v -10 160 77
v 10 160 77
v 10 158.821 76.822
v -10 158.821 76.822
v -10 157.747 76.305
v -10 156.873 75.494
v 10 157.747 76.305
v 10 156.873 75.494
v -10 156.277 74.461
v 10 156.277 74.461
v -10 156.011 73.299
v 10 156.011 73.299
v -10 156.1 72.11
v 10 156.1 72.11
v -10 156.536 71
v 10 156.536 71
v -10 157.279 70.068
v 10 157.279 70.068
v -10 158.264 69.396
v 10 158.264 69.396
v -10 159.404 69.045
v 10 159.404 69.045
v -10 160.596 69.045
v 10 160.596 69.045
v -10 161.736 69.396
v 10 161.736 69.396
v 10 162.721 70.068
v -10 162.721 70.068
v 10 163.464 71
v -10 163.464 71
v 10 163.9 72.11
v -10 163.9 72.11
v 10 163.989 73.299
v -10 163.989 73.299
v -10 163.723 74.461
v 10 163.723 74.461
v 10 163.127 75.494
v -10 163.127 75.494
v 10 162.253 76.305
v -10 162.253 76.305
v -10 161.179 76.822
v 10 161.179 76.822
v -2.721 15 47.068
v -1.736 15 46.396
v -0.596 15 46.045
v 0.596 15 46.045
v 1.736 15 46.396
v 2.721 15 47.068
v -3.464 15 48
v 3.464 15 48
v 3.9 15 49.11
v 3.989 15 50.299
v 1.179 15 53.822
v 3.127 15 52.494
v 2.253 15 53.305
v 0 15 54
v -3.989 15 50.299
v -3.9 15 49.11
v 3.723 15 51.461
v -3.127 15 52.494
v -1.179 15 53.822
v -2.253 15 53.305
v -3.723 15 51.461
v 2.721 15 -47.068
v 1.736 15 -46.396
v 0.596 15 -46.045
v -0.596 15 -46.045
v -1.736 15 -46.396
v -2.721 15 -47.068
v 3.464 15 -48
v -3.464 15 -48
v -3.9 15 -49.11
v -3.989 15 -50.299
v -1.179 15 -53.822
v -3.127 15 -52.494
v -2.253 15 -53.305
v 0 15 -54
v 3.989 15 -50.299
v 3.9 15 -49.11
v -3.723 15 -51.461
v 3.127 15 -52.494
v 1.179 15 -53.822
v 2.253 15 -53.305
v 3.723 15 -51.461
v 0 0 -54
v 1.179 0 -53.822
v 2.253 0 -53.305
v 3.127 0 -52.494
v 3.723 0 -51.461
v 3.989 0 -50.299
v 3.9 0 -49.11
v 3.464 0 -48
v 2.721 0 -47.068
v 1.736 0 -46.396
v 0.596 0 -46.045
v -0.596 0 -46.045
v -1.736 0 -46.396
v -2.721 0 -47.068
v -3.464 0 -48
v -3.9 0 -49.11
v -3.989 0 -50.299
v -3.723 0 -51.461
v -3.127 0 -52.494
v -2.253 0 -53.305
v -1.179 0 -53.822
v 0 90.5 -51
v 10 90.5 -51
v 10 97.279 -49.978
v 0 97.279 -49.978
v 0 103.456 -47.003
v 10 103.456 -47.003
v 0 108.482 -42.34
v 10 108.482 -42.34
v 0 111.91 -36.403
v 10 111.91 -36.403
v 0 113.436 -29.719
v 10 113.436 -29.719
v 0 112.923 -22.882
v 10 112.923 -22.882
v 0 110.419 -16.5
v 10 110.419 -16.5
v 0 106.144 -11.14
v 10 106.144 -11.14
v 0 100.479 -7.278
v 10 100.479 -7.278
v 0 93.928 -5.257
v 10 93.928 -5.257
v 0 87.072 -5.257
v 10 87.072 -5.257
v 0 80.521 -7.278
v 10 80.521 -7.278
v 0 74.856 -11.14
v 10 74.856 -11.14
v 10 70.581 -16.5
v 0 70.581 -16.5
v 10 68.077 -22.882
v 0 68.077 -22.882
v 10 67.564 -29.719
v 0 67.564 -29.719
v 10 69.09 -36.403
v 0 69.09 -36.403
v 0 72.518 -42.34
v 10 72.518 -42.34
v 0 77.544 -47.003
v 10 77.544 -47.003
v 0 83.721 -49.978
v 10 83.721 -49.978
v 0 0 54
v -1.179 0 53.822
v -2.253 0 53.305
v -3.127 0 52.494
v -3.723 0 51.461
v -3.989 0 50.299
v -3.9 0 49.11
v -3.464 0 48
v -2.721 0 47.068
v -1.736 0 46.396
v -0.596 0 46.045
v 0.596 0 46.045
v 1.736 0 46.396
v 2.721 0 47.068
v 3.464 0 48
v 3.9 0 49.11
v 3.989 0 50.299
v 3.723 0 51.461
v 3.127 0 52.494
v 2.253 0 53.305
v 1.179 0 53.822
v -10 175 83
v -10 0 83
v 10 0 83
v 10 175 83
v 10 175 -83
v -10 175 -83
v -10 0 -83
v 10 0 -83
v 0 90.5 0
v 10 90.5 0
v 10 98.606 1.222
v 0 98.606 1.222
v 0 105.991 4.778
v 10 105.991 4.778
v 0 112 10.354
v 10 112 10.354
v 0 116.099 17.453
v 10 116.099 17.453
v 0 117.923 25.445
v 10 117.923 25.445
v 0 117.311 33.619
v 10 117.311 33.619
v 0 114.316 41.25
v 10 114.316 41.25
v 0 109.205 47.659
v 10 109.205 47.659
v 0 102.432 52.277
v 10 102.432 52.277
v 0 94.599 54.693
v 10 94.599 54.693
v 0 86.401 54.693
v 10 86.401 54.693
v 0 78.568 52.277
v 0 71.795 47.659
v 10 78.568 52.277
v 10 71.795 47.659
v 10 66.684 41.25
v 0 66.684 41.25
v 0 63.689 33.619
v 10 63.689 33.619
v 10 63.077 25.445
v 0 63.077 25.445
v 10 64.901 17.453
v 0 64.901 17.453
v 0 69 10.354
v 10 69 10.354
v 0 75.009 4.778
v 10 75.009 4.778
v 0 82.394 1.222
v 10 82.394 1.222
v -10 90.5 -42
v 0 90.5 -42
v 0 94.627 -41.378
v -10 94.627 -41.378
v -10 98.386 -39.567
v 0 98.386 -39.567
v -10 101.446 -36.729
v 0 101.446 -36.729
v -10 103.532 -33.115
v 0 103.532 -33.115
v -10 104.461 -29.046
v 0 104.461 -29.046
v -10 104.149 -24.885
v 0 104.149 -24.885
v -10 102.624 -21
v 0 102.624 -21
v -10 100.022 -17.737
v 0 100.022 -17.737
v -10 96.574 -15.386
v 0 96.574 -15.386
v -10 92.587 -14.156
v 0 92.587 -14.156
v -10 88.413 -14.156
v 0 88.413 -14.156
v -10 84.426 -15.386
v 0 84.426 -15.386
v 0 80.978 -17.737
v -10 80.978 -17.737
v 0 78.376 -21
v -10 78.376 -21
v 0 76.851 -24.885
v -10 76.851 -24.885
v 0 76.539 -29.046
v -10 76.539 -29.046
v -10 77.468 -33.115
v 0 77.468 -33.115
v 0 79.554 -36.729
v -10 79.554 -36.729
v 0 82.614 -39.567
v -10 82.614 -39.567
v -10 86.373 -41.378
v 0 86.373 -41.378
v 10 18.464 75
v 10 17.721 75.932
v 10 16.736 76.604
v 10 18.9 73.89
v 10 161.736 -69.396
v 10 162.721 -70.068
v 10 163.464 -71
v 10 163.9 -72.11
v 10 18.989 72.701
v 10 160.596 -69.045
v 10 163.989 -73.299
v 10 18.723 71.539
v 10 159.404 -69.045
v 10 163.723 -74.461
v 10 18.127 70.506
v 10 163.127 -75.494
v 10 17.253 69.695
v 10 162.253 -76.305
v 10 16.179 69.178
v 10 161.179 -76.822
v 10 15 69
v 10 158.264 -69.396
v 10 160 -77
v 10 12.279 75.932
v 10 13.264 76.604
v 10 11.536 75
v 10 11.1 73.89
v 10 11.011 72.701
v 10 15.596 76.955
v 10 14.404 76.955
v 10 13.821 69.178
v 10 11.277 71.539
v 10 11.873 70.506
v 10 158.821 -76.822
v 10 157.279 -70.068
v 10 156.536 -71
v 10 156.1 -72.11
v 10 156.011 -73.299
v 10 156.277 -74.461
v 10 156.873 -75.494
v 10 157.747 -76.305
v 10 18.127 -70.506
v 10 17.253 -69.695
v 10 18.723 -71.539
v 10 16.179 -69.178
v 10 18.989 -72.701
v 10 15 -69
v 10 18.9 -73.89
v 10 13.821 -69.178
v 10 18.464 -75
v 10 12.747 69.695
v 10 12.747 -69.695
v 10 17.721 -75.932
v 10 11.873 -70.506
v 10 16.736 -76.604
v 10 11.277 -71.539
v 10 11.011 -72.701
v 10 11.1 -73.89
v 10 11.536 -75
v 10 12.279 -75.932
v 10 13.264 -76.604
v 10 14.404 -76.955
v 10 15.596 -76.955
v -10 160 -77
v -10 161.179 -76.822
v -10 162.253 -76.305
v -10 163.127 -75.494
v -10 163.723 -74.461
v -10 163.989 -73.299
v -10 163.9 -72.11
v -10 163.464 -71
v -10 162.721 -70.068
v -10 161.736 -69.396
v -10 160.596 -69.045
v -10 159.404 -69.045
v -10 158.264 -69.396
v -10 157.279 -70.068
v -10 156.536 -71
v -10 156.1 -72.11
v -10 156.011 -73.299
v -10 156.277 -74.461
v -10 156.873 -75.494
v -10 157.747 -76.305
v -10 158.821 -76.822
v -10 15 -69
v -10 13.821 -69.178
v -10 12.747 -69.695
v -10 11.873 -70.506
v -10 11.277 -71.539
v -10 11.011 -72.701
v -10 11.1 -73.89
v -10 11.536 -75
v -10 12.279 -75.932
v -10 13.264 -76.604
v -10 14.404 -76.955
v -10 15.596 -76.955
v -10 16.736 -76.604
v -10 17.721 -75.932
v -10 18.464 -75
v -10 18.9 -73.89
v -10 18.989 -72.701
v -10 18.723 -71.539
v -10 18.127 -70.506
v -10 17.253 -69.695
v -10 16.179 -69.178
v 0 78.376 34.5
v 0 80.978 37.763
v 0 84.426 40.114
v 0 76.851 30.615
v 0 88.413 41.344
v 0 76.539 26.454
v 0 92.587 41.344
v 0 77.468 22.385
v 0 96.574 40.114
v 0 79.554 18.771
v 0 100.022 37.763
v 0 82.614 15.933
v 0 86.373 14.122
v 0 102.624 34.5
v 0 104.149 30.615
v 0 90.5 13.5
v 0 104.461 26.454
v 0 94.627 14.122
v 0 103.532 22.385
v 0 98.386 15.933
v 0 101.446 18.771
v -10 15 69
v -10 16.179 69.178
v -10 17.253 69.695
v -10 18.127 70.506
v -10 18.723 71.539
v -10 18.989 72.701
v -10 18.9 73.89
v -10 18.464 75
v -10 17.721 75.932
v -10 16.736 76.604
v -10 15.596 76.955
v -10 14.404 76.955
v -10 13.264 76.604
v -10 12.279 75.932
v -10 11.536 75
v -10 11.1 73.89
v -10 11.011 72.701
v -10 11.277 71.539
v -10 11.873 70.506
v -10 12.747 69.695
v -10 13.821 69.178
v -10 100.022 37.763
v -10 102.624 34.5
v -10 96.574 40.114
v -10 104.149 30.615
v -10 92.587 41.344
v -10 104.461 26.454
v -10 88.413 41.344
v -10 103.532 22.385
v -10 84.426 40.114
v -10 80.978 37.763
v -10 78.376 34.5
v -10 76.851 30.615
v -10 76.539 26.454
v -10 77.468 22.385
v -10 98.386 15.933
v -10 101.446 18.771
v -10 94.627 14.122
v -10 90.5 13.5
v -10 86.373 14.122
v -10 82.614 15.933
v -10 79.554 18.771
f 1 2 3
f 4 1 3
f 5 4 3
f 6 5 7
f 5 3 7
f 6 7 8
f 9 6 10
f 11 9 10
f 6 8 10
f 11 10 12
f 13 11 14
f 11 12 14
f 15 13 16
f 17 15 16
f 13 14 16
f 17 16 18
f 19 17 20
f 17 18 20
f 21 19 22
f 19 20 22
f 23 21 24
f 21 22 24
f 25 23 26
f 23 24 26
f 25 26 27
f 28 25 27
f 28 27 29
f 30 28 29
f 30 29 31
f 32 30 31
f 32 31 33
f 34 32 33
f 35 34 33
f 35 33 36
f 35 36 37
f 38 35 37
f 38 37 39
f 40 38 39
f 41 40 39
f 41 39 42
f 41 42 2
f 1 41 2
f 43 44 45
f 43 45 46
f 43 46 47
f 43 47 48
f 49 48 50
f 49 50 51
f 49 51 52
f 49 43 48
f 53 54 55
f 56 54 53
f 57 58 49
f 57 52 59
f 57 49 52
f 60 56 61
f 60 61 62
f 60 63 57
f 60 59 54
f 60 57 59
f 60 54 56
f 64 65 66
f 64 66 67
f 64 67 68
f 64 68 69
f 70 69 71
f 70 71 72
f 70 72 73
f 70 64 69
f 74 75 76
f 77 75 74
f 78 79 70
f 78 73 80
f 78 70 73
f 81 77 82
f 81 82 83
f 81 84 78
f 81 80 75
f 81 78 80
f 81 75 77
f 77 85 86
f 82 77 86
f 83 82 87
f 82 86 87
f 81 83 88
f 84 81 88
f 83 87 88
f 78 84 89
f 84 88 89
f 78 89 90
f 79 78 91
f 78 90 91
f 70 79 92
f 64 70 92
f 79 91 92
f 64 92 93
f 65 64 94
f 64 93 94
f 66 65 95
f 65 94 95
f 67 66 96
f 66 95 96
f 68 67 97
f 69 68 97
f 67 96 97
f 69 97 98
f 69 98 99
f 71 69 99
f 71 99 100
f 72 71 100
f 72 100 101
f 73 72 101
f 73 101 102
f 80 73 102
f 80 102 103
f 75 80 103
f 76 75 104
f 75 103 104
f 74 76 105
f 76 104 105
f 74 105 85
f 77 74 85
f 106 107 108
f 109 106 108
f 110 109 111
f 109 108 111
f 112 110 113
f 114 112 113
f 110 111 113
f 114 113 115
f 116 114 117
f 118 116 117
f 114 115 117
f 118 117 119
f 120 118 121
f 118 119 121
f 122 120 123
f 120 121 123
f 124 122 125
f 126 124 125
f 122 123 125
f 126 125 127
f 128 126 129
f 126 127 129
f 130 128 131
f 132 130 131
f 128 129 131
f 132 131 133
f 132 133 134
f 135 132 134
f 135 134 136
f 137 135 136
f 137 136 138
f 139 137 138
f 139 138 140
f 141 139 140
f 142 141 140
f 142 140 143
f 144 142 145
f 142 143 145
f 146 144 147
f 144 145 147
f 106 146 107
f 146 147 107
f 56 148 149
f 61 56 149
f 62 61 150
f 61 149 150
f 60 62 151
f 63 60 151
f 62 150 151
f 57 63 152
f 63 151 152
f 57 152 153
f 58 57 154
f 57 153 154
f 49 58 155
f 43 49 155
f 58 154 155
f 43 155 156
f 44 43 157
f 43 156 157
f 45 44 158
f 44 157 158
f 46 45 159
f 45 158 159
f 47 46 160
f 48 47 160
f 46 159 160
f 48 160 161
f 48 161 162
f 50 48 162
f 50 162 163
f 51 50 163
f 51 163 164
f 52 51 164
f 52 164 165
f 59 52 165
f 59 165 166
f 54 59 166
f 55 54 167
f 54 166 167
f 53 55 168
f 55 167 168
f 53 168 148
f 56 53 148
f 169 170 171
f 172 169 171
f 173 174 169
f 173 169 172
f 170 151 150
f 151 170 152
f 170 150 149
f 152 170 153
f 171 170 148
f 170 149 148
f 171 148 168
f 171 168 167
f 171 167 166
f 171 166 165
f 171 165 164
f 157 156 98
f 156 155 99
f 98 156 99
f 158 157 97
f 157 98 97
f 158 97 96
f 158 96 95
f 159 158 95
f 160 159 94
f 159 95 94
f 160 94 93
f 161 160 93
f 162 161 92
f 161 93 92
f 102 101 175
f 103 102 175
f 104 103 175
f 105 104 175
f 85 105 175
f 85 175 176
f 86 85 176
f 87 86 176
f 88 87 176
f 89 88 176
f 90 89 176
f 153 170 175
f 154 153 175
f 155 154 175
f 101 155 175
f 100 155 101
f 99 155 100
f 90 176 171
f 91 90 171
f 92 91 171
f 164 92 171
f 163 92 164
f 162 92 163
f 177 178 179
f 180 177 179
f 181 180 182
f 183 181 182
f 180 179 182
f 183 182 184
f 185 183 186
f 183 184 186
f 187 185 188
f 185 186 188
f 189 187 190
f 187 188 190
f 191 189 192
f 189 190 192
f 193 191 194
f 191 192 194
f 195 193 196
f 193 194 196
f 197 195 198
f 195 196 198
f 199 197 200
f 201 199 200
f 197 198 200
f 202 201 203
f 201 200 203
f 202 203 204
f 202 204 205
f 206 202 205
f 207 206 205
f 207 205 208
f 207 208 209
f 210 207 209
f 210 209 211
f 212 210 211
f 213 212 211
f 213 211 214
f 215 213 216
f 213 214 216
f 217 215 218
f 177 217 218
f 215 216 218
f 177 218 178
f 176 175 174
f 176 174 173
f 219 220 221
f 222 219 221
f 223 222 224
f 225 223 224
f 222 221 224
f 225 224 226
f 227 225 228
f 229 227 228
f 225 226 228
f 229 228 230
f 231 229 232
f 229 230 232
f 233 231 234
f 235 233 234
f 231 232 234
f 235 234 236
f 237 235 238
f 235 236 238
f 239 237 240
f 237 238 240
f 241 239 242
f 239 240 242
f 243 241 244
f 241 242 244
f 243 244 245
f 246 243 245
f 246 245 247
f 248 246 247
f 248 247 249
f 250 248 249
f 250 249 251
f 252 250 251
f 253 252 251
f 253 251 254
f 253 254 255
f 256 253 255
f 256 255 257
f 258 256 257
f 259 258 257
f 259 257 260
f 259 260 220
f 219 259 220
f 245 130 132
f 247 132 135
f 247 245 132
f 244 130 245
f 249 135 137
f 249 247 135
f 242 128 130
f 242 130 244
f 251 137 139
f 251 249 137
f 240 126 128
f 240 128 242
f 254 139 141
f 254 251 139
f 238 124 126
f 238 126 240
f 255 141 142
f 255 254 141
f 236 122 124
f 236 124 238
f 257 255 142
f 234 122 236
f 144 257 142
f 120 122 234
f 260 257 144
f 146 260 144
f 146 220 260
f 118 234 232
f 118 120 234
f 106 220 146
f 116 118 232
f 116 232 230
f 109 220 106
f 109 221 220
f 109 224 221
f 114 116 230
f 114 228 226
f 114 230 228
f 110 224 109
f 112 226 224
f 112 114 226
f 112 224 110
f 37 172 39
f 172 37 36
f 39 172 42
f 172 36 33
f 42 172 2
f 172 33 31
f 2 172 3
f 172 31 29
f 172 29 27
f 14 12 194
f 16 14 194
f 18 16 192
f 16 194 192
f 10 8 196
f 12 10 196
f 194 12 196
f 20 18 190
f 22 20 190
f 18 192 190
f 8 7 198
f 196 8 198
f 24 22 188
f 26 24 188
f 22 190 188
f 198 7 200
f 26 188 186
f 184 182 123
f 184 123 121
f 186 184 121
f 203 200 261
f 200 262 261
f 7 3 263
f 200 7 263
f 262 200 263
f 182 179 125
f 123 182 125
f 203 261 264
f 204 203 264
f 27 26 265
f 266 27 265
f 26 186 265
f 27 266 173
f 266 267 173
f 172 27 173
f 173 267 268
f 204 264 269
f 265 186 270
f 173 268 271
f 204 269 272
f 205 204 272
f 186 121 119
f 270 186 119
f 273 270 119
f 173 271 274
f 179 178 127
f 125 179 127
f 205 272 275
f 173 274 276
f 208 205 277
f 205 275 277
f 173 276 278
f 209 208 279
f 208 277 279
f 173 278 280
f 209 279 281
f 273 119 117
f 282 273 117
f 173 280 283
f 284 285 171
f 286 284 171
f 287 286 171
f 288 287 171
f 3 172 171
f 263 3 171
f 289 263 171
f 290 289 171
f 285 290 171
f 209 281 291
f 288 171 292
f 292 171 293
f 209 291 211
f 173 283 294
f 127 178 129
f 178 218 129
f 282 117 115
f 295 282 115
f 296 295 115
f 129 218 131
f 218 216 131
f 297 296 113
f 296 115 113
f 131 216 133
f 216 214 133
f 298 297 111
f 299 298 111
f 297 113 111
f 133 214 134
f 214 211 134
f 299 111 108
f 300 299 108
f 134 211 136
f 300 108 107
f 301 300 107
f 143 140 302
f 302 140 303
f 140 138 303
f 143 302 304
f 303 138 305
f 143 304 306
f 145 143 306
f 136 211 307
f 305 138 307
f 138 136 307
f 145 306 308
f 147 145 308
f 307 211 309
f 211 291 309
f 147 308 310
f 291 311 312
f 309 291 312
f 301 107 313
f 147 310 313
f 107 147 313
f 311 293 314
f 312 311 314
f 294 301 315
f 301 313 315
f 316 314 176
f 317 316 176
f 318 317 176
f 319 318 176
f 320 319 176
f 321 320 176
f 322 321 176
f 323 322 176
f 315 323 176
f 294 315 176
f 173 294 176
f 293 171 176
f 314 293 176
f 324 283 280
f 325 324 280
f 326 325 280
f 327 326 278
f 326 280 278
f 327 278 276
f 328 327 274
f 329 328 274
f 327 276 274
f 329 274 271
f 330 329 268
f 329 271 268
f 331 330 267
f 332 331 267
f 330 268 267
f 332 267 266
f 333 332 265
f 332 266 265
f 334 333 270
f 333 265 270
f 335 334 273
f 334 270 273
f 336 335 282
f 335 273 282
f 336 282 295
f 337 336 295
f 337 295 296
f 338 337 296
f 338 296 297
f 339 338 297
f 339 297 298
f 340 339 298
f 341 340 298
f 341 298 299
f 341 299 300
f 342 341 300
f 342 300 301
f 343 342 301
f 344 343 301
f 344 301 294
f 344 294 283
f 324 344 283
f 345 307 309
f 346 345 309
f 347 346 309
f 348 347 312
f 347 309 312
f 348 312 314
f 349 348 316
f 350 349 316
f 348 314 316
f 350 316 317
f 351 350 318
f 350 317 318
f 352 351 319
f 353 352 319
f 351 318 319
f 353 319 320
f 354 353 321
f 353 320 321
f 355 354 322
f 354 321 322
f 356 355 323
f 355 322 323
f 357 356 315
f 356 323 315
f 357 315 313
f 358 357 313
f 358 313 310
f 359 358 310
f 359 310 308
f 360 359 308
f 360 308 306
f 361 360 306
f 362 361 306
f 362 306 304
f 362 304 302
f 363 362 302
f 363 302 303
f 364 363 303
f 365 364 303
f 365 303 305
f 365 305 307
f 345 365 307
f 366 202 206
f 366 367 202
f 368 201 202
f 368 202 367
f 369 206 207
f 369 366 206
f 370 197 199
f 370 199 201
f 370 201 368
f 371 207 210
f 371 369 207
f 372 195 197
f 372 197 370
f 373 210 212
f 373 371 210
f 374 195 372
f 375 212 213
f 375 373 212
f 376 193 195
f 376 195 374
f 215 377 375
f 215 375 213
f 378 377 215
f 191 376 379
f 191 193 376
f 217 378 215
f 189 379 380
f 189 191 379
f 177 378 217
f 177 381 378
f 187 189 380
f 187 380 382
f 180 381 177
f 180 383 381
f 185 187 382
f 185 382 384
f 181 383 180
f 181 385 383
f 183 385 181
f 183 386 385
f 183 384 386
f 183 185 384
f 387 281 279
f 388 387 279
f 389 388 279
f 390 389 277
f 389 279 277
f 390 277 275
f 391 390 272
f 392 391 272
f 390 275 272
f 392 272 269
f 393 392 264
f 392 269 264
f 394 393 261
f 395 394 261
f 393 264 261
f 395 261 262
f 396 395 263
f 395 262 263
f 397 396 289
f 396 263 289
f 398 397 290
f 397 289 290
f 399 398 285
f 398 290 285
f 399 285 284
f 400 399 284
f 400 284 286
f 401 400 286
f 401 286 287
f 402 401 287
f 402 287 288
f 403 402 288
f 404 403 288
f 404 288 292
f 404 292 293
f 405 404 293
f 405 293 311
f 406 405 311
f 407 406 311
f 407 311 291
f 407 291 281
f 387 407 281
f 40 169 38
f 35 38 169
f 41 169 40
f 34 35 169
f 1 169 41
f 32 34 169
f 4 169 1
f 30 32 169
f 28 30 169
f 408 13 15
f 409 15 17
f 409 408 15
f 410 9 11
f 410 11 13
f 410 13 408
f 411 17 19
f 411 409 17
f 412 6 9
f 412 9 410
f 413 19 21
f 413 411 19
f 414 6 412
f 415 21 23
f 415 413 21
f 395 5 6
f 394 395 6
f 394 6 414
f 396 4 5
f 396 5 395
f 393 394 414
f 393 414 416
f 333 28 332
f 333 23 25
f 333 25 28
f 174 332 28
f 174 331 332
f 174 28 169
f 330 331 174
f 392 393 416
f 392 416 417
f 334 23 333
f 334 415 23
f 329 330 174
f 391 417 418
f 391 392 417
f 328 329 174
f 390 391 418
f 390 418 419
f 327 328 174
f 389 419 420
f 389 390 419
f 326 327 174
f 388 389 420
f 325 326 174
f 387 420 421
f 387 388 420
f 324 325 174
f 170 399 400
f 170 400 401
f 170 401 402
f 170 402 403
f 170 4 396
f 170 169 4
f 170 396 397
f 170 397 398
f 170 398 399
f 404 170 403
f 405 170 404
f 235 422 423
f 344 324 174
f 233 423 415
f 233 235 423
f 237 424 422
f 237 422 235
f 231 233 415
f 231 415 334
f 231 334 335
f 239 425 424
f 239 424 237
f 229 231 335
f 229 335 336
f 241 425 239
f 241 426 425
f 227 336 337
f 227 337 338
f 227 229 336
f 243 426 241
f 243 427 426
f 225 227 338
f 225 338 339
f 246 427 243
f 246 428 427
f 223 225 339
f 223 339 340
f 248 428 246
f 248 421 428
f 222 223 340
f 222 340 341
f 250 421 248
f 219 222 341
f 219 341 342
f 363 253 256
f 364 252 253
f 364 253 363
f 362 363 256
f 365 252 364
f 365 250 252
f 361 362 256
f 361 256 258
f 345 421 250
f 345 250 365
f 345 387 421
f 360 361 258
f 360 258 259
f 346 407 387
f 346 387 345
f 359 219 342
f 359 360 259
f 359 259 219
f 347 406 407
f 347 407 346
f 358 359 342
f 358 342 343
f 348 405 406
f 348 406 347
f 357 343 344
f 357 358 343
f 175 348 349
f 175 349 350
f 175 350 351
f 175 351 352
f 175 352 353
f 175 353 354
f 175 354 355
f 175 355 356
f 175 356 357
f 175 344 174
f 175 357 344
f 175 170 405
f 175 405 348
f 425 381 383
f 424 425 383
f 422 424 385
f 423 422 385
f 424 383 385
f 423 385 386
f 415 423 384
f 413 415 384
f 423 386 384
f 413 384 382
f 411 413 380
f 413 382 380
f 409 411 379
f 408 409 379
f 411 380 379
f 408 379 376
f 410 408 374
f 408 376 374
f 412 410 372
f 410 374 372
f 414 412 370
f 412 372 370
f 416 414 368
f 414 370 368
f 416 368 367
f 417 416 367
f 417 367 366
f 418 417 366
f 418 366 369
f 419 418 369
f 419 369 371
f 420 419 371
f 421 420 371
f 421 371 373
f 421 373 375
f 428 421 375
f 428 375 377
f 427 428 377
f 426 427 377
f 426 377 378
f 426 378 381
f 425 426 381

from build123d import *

# Parameters (mm, degrees)
SKETCH1_W           = 20
SKETCH1_H           = 166
BOSS_EXTRUDE1_DEPTH = 175
SKETCH2_R           = 14
CUT_EXTRUDE1_DEPTH  = 175
SKETCH3_R           = 27.5
SKETCH3_R_2         = 23
CUT_EXTRUDE2_DEPTH  = 10
SKETCH4_R           = 4
CUT_EXTRUDE3_DEPTH  = 195.715176604
SKETCH5_R           = 4
CUT_EXTRUDE4_DEPTH  = 15


with BuildPart() as part:
    # Sketch1 → Boss-Extrude1 (new body)
    with BuildSketch(Plane(origin=(0, 0, 0), x_dir=(1, 0, 0), z_dir=(0, 1, 0))):
        Rectangle(SKETCH1_W, SKETCH1_H)
    extrude(amount=BOSS_EXTRUDE1_DEPTH)

    # Sketch2 → Cut-Extrude1 (cut)
    with BuildSketch(Plane(origin=(10, 0, 0), x_dir=(0, 0, -1), z_dir=(1, 0, 0))):
        with Locations((-27.5, 90.5)):
            Circle(SKETCH2_R)
        with Locations((28, 90.5)):
            Circle(SKETCH2_R)
    extrude(amount=-CUT_EXTRUDE1_DEPTH, mode=Mode.SUBTRACT)

    # Sketch3 → Cut-Extrude2 (cut)
    with BuildSketch(Plane(origin=(10, 0, 0), x_dir=(0, 0, -1), z_dir=(1, 0, 0))):
        with Locations((-27.5, 90.5)):
            Circle(SKETCH3_R)
        with Locations((28, 90.5)):
            Circle(SKETCH3_R_2)
    extrude(amount=-CUT_EXTRUDE2_DEPTH, mode=Mode.SUBTRACT)

    # Sketch4 → Cut-Extrude3 (cut, through all)
    with BuildSketch(Plane(origin=(10, 0, 0), x_dir=(0, 0, -1), z_dir=(1, 0, 0))):
        with Locations((73, 160)):
            Circle(SKETCH4_R)
        with Locations(Location((73, 15, 0), (0, 0, 180))):
            Circle(SKETCH4_R)
        with Locations((-73, 15)):
            Circle(SKETCH4_R)
        with Locations(Location((-73, 160, 0), (0, 0, 180))):
            Circle(SKETCH4_R)
    extrude(amount=-CUT_EXTRUDE3_DEPTH, mode=Mode.SUBTRACT)

    # Sketch5 → Cut-Extrude4 (cut)
    with BuildSketch(Plane.XZ):
        with Locations(Location((0, -50, 0), (0, 0, 270))):
            Circle(SKETCH5_R)
        with Locations(Location((0, 50, 0), (0, 0, 90))):
            Circle(SKETCH5_R)
    extrude(amount=-CUT_EXTRUDE4_DEPTH, mode=Mode.SUBTRACT)


solid = part.part
